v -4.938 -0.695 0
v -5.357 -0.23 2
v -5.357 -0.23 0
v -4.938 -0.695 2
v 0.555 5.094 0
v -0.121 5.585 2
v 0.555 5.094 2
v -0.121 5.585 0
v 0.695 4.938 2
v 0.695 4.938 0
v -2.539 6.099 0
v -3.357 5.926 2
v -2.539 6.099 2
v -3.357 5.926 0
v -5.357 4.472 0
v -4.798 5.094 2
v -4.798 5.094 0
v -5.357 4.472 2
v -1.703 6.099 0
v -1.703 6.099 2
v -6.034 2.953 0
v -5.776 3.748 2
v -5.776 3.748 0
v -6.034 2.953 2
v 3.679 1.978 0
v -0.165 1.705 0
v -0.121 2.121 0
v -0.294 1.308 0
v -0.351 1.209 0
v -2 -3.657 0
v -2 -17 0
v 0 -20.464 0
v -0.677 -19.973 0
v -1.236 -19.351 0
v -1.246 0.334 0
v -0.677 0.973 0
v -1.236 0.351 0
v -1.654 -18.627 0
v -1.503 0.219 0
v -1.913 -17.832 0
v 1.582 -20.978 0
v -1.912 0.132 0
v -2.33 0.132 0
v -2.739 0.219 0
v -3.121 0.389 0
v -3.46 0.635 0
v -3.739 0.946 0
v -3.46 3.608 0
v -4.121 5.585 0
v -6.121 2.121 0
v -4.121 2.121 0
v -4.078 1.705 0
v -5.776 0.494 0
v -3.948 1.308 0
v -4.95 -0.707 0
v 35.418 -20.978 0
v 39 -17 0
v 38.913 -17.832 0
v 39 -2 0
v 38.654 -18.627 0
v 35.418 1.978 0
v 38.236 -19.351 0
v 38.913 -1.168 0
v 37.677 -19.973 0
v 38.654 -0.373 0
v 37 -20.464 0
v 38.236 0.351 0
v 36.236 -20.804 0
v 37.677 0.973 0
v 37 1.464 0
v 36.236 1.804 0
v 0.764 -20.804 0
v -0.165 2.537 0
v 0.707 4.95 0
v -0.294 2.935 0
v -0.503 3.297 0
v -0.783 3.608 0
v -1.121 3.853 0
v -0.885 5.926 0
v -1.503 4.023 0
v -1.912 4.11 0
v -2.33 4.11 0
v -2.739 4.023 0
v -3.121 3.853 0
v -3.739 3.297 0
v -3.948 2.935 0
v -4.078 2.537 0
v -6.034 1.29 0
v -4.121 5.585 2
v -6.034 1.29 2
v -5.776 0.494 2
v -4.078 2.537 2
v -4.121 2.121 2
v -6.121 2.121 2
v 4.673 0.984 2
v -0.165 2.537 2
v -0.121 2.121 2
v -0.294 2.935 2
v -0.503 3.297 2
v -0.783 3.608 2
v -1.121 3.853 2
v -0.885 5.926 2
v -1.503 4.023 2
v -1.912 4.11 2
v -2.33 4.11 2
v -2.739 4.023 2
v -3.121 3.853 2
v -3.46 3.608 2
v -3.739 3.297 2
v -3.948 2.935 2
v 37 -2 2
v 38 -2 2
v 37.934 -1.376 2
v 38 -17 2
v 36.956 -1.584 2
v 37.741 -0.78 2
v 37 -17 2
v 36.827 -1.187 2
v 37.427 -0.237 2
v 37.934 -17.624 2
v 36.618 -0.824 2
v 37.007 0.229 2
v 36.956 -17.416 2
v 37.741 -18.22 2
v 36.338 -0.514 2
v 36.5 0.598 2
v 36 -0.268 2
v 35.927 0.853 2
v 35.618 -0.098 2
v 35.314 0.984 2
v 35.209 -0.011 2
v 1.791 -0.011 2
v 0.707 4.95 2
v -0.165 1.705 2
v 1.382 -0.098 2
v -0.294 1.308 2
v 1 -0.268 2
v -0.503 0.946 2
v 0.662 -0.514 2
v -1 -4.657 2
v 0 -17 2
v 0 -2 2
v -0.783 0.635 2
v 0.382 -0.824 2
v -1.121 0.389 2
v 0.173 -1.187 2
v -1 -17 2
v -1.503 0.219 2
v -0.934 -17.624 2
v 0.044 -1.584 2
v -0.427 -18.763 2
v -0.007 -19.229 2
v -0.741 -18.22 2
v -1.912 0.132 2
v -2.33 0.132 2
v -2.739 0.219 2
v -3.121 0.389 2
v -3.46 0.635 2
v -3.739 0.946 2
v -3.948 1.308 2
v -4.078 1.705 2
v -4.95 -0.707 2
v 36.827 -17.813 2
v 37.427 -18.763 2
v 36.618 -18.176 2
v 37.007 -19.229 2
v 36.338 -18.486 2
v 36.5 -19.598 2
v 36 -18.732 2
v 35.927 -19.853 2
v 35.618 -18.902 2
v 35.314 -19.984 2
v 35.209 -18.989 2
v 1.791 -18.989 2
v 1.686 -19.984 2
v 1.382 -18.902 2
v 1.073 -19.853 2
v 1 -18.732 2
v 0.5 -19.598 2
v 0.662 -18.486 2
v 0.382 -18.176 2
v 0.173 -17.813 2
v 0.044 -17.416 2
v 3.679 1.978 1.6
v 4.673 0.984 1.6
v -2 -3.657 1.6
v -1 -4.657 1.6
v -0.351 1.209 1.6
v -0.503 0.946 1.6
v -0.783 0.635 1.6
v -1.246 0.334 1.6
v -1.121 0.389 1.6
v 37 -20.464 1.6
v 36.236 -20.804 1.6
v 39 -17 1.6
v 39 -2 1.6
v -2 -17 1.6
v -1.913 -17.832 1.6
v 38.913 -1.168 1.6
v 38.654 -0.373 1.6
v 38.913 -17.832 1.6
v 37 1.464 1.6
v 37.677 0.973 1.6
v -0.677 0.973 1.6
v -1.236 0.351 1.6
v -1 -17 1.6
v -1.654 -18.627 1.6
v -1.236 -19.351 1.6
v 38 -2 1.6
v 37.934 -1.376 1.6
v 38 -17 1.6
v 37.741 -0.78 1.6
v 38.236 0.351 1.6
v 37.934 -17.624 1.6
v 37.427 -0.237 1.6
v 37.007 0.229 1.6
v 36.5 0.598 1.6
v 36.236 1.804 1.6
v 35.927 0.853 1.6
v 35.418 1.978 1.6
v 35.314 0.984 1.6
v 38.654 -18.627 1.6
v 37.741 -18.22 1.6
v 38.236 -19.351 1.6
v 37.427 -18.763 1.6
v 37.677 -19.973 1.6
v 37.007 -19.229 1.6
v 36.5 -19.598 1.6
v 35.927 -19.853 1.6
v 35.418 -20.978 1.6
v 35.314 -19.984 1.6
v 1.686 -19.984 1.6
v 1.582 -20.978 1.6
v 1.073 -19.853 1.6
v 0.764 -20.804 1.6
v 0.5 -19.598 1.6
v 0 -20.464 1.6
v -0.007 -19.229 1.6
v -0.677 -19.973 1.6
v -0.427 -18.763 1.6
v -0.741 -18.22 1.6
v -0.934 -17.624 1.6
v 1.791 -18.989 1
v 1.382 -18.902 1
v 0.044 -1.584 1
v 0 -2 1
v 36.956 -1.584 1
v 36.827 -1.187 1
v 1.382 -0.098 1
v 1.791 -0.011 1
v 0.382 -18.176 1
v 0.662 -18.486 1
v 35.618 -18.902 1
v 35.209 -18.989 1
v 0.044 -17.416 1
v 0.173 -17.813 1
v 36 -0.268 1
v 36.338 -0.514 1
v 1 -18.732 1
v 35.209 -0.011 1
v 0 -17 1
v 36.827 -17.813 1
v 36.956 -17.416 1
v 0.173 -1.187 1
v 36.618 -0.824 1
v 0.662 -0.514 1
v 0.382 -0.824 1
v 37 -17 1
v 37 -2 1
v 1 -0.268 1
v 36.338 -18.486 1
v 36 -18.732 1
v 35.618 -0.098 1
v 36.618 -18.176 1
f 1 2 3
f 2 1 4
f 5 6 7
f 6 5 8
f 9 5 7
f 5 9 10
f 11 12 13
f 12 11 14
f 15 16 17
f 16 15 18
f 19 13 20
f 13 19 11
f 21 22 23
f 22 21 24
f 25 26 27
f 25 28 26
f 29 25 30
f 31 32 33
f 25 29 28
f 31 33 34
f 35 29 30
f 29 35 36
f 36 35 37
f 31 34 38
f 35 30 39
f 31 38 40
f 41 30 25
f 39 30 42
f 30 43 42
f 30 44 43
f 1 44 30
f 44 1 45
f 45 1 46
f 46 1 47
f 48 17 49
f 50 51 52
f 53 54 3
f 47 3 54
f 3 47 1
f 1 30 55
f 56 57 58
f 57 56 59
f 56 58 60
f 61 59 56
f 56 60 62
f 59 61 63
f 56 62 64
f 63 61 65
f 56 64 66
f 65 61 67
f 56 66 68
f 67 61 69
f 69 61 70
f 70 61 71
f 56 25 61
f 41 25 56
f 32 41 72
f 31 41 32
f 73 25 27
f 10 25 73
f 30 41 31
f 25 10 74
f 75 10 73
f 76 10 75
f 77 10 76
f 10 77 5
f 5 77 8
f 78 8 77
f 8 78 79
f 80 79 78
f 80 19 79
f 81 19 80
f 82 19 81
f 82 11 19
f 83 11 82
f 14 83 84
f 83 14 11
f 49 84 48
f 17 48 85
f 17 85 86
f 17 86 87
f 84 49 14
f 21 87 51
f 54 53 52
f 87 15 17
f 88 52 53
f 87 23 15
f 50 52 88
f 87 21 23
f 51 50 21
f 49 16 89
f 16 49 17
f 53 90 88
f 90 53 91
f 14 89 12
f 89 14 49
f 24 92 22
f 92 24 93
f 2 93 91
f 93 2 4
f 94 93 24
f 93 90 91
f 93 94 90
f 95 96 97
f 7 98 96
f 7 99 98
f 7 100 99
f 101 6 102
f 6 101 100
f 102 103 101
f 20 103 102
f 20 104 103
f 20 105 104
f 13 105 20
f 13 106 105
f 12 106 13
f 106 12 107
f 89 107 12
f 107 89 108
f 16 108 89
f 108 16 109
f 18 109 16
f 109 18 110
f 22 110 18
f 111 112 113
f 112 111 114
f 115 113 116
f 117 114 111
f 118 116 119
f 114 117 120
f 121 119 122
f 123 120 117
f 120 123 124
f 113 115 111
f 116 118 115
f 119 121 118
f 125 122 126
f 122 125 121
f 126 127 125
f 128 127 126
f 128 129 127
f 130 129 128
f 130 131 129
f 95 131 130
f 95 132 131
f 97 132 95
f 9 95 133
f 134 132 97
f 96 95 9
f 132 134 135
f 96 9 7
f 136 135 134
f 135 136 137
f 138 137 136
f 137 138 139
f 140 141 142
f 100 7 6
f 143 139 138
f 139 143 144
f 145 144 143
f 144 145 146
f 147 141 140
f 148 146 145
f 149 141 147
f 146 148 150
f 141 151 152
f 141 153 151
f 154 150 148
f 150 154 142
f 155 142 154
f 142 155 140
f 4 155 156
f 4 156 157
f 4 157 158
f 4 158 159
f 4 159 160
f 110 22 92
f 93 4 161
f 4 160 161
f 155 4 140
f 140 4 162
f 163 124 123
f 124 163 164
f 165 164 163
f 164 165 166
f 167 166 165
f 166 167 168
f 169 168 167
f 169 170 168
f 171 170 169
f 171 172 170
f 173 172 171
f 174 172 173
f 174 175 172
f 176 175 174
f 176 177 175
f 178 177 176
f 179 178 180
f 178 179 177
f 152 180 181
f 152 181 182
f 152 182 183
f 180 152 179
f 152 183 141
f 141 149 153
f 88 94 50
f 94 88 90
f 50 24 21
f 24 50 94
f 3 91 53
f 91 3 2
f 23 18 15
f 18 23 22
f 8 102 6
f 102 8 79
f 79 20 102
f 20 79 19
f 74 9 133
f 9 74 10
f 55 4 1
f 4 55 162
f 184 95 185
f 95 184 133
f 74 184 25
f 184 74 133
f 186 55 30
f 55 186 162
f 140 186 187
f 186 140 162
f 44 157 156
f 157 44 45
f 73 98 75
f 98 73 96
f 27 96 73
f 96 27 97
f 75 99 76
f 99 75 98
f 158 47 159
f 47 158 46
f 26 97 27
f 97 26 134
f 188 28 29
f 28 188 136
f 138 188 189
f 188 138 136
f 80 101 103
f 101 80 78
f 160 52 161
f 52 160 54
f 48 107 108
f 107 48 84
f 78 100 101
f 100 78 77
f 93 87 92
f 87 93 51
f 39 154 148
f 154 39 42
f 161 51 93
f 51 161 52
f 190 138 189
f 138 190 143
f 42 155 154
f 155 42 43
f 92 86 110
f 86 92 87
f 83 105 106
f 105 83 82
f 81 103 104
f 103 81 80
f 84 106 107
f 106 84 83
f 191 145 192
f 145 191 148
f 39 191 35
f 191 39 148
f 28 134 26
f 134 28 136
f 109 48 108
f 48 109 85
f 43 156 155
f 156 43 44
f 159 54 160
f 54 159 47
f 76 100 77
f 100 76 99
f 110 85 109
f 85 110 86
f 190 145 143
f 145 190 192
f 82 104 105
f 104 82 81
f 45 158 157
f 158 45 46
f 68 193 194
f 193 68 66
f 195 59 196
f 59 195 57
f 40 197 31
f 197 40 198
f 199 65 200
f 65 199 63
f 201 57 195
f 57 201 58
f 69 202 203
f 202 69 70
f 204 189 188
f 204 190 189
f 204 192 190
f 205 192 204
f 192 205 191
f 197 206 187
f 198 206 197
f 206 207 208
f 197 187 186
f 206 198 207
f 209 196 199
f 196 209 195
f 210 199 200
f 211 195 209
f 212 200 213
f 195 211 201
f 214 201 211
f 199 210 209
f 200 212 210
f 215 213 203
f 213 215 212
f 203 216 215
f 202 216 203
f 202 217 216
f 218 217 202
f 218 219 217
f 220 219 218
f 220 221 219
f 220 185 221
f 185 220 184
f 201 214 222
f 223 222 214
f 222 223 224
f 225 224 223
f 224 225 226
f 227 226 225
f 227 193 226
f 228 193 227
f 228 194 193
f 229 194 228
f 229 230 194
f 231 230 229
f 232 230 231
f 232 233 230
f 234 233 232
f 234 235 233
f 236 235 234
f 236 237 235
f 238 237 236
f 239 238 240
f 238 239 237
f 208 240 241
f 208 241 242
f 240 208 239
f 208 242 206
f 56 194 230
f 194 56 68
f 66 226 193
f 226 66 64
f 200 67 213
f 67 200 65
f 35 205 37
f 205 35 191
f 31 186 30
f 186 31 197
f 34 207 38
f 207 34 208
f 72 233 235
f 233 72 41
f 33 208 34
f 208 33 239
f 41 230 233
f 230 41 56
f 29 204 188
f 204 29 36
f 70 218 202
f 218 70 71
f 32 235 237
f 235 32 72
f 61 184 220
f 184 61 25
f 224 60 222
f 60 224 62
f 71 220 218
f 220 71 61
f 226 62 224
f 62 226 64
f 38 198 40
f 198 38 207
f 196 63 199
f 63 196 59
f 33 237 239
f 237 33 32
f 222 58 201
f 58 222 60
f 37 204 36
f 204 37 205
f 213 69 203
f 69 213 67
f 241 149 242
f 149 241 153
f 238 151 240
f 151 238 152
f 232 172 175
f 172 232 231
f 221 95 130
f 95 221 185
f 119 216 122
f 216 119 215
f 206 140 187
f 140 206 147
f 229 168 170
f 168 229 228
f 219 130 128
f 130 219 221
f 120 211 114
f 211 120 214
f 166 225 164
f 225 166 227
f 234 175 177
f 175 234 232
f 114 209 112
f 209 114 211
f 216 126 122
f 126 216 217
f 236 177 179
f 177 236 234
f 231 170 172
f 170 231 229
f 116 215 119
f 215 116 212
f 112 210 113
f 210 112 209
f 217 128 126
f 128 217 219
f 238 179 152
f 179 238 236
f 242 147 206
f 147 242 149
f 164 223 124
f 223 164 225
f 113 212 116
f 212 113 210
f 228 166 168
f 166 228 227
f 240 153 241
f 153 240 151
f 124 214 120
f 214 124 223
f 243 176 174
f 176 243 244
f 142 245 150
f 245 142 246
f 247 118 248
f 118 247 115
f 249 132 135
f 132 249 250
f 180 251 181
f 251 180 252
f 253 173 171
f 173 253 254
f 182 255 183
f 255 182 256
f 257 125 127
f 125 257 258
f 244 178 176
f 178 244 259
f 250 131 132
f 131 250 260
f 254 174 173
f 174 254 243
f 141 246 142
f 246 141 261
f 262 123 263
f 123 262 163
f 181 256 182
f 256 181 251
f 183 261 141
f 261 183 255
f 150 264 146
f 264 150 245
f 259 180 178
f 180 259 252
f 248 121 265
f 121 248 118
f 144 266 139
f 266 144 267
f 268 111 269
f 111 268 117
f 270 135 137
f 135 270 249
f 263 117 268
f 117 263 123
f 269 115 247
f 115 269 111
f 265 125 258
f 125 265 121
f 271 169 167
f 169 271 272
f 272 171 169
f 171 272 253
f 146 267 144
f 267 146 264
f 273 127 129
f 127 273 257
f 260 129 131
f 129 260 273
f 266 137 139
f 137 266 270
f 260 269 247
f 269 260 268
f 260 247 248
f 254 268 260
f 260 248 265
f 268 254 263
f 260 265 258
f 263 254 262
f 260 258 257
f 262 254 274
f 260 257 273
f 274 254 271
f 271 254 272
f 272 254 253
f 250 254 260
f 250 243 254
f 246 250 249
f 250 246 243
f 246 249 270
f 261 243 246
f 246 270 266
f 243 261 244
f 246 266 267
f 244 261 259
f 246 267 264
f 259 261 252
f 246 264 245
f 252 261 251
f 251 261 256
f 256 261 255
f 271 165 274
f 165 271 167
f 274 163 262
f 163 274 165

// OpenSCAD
use <write/Write.scad>

/* [Global] */

quality=30;

/* [Parameters] */

//set to false if no lug is desired
build_lug=1; // [0:false, 1:true]

plate_thickness = 1.0;
label_thickness = 0.6;
frame_thickness = 1.0;

/* [Text] */

text_line_1 = "OpenSCAD";
font_height = 6;
label_font="orbitron.dxf"; //[orbitron.dxf,Letters.dxf,knewave.dxf,BlackRose.dxf,braille.dxf]

/* [Frame] */

frame_width = 2.0;
frame_space = 2.0;
frame_rounding_inner = 2.0;
frame_rounding = frame_rounding_inner + frame_width;

/* [Lug] */

hole_diameter=4.0;
lug_thick=2.0;
lug_diameter=hole_diameter+2*lug_thick;		

/* [Hidden] */

lines=[
	text_line_1,
	str(version()[0],".",version()[1],".",version()[2]),
];

chars_per_line = max(len(lines[0]),len(lines[1]));
number_of_lines = 2;

function get_text_width() = chars_per_line*11/16*font_height;
function get_text_height() = (1.5*number_of_lines-.5)*font_height;

// Ok, lets build the keychain!
union()
{
	build_plate();
	write_lines(lines);
}

module build_lug()
assign(h=plate_thickness+frame_thickness)
translate([-(hole_diameter+frame_rounding_inner)/2*sqrt(.5), (hole_diameter+frame_rounding_inner)/2*sqrt(.5), 0])
difference()
{
	union()
	{
		cylinder(r=lug_diameter/2,h=h, $fn=quality);

		rotate([0,0,-45])
		translate([0,-lug_diameter/2,0])
		cube([lug_diameter,lug_diameter,h]);
	}

	cylinder(r=hole_diameter/2,h=h, $fn=quality);
}

module build_plate()
assign(x0=frame_rounding_inner,y0=frame_rounding_inner)
assign(x1=get_text_width()+2*frame_space-frame_rounding_inner)
assign(y1=get_text_height()+2*frame_space-frame_rounding_inner)
difference()
{
	union()
	{
		hull()
		for(x=[x0,x1],y=[-y0,-y1])
		translate([x,y,0])
		cylinder(r=frame_rounding,h=plate_thickness+label_thickness, $fn=quality);

		hull()
		for(x=[x0,x1],y=[-y0,-y1])
		translate([x,y,0])
		cylinder(r=(frame_rounding+frame_rounding_inner)/2,h=plate_thickness+frame_thickness, $fn=quality);

		if(build_lug)
			build_lug();
	}

	hull()
	for(x=[x0,x1],y=[-y0,-y1])
	translate([x,y,plate_thickness])
	cylinder(r=frame_rounding_inner,h=frame_thickness+.1, $fn=quality);
}

module write_lines(lines)
for(idx=[0:len(lines)])
write_line(idx, lines[idx]);

module write_line(idx, text)
if(len(text)>0)
{
	translate([frame_space,-frame_space-(1.5*(idx+1)-.5)*font_height,plate_thickness])
	write(text, h=font_height, t=label_thickness, font=label_font, center=false);
}
